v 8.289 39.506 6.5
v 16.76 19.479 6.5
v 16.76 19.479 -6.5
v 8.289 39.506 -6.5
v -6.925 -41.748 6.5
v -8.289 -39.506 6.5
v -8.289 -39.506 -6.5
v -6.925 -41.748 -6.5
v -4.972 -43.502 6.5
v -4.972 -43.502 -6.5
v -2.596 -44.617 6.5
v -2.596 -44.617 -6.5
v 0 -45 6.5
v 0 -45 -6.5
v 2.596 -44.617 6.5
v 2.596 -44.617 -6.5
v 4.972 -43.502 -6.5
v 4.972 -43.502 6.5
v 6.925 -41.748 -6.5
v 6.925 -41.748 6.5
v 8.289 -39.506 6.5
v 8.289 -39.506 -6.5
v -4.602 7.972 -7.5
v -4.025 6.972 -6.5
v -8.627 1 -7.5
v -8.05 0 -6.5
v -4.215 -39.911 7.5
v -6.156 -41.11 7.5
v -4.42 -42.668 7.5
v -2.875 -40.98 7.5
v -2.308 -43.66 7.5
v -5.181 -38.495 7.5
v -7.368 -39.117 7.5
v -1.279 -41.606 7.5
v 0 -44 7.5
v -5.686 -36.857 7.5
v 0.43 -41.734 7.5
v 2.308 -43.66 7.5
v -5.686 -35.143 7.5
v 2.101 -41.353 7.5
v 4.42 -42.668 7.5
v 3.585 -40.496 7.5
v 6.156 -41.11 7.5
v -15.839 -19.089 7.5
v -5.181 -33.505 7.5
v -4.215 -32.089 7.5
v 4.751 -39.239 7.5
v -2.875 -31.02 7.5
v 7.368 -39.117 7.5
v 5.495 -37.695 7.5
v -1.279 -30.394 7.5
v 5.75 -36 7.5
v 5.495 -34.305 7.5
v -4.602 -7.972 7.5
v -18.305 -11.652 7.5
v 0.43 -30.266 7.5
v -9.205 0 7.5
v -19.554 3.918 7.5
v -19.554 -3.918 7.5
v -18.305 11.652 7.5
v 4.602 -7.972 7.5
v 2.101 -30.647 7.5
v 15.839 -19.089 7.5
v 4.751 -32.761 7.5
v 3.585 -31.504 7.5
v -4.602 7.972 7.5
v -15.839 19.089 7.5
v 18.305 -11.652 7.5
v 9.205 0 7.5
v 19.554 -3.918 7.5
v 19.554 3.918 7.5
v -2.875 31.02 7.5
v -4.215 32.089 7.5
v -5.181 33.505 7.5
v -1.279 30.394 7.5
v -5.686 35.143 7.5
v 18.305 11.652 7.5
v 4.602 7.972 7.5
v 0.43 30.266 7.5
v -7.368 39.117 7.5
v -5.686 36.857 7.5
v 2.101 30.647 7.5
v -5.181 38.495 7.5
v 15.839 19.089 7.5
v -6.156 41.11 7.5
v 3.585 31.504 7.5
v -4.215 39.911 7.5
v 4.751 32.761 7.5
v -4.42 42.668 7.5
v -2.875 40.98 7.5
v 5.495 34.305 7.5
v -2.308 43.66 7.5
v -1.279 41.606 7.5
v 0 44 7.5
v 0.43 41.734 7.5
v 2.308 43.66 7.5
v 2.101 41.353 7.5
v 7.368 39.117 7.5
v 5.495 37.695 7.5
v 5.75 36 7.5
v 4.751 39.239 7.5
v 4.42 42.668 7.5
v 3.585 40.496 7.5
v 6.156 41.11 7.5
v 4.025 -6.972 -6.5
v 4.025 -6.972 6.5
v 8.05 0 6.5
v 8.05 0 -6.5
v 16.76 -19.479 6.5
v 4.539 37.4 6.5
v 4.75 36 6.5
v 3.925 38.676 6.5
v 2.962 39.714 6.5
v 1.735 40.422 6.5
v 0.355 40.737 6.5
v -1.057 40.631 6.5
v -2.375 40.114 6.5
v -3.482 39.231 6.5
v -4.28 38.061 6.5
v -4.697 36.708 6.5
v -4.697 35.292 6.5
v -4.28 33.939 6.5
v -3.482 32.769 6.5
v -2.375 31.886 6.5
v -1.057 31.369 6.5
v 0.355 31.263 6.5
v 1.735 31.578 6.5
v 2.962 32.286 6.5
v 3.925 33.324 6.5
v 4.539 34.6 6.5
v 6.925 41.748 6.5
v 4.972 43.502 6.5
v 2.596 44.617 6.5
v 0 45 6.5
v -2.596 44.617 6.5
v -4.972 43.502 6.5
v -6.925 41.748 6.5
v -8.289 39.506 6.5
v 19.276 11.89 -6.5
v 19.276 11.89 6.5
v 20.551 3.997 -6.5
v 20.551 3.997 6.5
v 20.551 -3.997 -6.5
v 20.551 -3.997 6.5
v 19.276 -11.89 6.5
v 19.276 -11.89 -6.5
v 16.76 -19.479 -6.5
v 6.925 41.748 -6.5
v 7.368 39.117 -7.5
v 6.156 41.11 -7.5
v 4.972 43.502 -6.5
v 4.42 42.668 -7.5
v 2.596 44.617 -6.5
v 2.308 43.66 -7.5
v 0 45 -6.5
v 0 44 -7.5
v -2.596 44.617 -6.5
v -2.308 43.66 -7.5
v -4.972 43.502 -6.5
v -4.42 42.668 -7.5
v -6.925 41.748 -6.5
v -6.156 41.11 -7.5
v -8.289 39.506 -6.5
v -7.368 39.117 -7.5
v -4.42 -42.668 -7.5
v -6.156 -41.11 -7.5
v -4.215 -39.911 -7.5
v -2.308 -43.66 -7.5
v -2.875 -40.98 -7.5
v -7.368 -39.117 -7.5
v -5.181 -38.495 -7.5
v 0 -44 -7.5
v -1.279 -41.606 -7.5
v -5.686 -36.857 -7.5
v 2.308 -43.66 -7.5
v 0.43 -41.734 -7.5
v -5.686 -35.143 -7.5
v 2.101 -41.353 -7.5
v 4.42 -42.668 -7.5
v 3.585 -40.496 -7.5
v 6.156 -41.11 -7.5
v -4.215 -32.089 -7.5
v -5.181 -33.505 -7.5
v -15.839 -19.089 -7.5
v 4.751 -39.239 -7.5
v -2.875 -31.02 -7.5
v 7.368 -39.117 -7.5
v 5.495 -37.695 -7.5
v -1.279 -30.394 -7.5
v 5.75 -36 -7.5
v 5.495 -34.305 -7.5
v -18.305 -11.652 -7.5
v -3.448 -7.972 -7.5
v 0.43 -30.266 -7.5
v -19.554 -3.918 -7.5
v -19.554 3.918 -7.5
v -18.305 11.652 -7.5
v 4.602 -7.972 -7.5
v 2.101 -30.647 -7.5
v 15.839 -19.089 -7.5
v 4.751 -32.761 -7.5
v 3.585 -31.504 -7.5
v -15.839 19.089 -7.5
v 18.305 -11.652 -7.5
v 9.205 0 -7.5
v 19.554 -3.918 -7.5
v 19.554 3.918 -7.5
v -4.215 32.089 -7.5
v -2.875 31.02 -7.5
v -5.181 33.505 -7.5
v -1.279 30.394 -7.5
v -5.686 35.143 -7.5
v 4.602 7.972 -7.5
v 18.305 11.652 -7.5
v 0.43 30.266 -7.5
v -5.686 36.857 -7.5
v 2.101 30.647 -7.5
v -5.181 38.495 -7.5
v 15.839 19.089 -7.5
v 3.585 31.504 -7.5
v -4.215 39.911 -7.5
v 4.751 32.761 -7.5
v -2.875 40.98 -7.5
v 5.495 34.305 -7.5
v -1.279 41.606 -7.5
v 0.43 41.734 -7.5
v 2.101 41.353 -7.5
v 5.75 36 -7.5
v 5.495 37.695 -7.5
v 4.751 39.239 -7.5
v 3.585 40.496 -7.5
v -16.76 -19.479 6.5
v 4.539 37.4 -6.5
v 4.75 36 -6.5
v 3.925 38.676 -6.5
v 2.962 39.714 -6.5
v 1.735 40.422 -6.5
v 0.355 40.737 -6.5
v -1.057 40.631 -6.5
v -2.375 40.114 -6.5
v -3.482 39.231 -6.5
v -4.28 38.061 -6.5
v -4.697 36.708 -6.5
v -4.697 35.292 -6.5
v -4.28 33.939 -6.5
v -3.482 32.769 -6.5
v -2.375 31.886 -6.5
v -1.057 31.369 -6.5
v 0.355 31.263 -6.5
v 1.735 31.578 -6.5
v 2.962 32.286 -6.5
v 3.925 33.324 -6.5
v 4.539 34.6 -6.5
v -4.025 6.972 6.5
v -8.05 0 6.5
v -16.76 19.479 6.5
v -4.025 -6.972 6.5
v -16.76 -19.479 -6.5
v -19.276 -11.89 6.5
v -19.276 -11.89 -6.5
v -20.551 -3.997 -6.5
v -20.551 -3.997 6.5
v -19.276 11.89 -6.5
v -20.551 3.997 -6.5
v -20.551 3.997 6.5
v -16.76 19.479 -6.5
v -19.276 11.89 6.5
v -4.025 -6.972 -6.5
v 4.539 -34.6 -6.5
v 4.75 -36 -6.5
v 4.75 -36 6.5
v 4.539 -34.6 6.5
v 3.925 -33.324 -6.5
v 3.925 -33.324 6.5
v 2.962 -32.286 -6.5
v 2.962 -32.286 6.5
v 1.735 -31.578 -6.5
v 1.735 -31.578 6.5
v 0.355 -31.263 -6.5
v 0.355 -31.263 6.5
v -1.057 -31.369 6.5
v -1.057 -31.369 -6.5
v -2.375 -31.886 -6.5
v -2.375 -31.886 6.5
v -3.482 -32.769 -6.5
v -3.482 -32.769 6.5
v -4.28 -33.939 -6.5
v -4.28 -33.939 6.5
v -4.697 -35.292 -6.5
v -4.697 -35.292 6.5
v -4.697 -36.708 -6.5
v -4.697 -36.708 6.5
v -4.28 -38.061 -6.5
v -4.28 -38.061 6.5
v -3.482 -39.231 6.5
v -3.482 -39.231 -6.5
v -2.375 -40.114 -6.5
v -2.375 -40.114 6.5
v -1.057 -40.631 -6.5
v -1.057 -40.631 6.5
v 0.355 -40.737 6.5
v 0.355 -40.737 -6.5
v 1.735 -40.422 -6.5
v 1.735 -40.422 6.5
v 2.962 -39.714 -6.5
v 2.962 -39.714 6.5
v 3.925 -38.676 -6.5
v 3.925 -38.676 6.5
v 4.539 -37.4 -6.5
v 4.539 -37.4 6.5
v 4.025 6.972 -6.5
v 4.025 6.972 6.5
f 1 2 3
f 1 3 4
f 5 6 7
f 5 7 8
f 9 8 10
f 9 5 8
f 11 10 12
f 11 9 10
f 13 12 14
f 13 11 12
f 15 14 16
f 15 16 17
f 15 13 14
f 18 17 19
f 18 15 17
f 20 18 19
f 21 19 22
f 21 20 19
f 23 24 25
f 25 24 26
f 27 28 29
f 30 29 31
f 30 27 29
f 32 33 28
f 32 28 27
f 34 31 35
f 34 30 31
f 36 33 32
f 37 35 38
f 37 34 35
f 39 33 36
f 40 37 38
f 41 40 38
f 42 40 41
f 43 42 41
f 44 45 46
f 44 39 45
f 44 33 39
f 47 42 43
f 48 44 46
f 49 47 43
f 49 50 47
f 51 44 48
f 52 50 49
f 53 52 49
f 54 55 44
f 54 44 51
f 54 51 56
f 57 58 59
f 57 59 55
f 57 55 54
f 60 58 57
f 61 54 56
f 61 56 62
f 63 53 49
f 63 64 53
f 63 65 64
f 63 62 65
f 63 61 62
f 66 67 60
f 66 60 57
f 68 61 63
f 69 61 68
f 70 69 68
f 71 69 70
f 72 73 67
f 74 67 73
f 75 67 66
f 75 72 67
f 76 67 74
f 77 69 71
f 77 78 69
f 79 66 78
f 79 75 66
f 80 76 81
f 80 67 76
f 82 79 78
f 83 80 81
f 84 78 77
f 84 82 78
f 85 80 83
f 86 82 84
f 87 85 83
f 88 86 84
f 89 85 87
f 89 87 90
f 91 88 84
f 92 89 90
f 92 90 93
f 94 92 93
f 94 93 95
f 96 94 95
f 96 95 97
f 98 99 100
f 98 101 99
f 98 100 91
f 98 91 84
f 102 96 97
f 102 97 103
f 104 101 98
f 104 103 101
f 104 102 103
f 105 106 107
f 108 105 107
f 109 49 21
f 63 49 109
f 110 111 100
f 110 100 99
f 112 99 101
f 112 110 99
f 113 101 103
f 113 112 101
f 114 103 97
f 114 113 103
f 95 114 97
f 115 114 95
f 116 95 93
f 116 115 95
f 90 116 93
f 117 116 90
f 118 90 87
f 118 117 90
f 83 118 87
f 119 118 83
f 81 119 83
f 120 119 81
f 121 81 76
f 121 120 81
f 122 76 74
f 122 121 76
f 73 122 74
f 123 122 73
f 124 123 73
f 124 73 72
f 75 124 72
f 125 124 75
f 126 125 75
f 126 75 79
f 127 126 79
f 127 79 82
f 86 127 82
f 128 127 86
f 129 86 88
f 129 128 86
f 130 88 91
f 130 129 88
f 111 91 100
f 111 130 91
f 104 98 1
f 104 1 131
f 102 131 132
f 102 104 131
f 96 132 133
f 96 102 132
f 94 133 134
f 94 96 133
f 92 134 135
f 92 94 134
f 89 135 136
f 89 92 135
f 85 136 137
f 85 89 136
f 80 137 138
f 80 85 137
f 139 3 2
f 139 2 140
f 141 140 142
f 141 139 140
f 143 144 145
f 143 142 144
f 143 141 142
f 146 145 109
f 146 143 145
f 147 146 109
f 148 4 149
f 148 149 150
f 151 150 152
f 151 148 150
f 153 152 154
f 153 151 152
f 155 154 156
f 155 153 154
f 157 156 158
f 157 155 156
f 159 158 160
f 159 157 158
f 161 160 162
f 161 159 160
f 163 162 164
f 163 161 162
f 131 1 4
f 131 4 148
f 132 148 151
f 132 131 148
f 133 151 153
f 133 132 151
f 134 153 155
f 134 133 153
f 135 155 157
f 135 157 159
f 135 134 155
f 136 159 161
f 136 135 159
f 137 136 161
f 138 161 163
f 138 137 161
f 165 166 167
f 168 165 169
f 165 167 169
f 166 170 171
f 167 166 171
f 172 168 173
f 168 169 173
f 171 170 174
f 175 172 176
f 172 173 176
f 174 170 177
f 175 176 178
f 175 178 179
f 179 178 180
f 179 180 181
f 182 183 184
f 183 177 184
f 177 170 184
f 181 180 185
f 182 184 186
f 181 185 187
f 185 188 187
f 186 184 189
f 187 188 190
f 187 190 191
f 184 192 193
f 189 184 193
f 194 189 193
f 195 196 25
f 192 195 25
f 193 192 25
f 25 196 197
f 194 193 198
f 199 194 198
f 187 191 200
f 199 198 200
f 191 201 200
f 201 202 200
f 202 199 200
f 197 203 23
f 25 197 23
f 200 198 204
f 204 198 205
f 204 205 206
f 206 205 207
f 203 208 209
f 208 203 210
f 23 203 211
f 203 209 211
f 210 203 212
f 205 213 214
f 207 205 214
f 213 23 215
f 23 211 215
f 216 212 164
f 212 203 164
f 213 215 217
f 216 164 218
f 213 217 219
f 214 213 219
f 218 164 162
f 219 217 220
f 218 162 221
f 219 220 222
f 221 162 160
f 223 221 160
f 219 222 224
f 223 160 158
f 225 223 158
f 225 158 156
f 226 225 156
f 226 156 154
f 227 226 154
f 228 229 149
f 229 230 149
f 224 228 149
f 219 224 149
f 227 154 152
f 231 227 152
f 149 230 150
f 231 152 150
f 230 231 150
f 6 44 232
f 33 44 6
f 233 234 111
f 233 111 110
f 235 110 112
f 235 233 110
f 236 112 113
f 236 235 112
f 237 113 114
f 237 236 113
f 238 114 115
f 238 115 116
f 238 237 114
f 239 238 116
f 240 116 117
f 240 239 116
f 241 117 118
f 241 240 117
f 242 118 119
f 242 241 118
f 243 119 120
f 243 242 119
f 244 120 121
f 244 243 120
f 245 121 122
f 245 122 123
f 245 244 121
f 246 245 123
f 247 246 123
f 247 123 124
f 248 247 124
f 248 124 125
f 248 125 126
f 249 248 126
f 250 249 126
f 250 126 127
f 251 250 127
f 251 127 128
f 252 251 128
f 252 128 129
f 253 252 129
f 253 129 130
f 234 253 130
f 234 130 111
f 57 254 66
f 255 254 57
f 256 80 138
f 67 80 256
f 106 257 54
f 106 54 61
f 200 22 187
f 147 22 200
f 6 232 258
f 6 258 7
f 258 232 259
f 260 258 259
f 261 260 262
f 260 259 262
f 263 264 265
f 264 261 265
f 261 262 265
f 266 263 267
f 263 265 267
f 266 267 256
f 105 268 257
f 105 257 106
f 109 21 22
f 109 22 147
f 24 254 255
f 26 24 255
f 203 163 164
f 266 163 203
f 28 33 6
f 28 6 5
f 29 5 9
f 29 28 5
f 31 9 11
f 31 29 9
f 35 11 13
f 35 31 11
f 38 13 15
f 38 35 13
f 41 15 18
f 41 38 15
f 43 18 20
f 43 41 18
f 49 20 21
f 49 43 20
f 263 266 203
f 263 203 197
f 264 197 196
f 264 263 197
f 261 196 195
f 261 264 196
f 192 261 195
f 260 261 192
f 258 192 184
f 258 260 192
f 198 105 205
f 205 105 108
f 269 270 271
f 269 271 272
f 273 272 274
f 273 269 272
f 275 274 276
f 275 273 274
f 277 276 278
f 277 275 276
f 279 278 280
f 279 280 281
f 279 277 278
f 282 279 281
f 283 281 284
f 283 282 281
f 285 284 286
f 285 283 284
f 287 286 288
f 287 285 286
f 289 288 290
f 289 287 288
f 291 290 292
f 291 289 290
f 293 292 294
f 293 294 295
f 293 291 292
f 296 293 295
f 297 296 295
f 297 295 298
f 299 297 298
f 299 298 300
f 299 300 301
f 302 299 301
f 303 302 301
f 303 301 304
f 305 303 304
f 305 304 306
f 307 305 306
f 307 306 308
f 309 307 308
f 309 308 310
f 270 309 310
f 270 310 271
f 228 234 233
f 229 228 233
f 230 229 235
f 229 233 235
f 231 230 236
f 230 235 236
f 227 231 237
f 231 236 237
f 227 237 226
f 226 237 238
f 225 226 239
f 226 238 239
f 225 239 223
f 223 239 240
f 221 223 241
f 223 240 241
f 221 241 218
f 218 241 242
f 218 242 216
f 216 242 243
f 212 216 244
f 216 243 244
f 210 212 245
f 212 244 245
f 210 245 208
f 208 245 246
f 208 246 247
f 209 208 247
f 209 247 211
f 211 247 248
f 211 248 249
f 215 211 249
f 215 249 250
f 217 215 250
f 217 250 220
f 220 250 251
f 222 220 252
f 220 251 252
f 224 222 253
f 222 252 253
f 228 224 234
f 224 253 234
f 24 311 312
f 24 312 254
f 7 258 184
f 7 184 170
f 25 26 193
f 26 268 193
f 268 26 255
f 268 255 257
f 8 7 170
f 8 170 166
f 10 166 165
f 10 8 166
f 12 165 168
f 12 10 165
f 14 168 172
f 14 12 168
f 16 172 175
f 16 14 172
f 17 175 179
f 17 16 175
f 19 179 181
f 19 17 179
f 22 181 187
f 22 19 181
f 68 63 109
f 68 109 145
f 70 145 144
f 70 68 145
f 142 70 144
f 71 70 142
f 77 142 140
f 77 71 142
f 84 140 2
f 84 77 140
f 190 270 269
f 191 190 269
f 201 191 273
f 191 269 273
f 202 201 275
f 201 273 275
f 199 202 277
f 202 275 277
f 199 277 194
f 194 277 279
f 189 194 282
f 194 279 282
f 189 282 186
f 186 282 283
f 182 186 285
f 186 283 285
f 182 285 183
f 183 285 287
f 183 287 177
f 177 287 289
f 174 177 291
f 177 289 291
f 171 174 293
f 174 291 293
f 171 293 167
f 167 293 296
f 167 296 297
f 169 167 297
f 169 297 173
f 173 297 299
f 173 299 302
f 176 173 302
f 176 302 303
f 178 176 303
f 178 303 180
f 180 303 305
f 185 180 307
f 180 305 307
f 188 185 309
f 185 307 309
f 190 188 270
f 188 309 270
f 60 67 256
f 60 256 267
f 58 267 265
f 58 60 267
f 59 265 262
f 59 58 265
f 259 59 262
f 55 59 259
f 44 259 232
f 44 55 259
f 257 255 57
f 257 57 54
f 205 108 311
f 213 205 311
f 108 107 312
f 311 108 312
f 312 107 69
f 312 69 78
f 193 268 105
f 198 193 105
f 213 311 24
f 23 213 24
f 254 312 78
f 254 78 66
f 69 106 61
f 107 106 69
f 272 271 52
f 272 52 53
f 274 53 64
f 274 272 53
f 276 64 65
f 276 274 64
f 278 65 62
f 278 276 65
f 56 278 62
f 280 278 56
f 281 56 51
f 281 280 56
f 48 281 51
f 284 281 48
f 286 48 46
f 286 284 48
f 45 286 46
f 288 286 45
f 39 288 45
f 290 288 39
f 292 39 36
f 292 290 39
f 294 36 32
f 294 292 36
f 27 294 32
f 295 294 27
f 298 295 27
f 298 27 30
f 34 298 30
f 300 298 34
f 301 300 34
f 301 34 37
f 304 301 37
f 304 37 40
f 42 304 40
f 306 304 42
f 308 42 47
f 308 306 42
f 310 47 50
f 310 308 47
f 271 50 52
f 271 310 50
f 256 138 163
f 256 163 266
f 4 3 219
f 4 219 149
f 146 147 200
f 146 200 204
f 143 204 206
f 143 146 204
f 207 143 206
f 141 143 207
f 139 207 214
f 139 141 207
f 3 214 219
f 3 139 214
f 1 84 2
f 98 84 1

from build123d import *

# Parameters (mm, degrees)
F0_R     = 4.75
F1_DEPTH = 7.5
F2_R     = 50
F3_SIZE  = 1
F5_DEPTH = 25
F6_SIZE  = 1


with BuildPart() as f1:
    # F0 (on Top) → F1 (new body, symmetric)
    with BuildSketch(Plane.XY):
        with BuildLine():
            Line((25, 0), (8.288939, 39.506208))
            ThreePointArc((8.288939, 39.506208), (0, 45), (-8.288939, 39.506208))
            Line((-8.288939, 39.506208), (-25, 0))
            Line((-25, 0), (-8.288939, -39.506208))
            ThreePointArc((-8.288939, -39.506208), (0, -45), (8.288939, -39.506208))
            Line((8.288939, -39.506208), (25, 0))
        make_face()
        with Locations((0, -36)):
            Circle(F0_R, mode=Mode.SUBTRACT)
        with Locations((0, 36)):
            Circle(F0_R, mode=Mode.SUBTRACT)
    extrude(amount=F1_DEPTH, both=True)

    # F2
    f2_edges = [f1.edges().sort_by_distance(p)[0] for p in [
        (-25, 0, 0),
        (25, 0, 0),
    ]]
    fillet(f2_edges, radius=F2_R)

    # F3
    f3_edges = [f1.edges().sort_by_distance(p)[0] for p in [
        (0, 45, 7.5),
        (0, 45, -7.5),
        (-12.524692, -29.492569, 7.5),
        (-12.524692, -29.492569, -7.5),
    ]]
    chamfer(f3_edges, length=F3_SIZE)

    # F4 (on face) → F5 (cut)
    with BuildSketch(Plane.XY.offset(7.5)):
        Polygon((-4.025, 6.971505), (-8.05, 0), (-4.025, -6.971505), (4.025, -6.971505), (8.05, 0), (4.025, 6.971505), align=None)
    extrude(amount=-F5_DEPTH, mode=Mode.SUBTRACT)

    # F6
    f6_edges = [f1.edges().sort_by_distance(p)[0] for p in [
        (-4.75, 36, 7.5),
        (-4.75, 36, -7.5),
        (-4.75, -36, 7.5),
        (-4.75, -36, -7.5),
        (0, -6.971505, 7.5),
        (-6.0375, -3.485752, 7.5),
        (-6.0375, 3.485752, 7.5),
        (0, 6.971505, 7.5),
        (6.0375, 3.485752, 7.5),
        (6.0375, -3.485752, 7.5),
        (0, -6.971505, -7.5),
        (6.0375, -3.485752, -7.5),
        (6.0375, 3.485752, -7.5),
        (0, 6.971505, -7.5),
        (-6.0375, 3.485752, -7.5),
    ]]
    chamfer(f6_edges, length=F6_SIZE)


solid = f1.part
